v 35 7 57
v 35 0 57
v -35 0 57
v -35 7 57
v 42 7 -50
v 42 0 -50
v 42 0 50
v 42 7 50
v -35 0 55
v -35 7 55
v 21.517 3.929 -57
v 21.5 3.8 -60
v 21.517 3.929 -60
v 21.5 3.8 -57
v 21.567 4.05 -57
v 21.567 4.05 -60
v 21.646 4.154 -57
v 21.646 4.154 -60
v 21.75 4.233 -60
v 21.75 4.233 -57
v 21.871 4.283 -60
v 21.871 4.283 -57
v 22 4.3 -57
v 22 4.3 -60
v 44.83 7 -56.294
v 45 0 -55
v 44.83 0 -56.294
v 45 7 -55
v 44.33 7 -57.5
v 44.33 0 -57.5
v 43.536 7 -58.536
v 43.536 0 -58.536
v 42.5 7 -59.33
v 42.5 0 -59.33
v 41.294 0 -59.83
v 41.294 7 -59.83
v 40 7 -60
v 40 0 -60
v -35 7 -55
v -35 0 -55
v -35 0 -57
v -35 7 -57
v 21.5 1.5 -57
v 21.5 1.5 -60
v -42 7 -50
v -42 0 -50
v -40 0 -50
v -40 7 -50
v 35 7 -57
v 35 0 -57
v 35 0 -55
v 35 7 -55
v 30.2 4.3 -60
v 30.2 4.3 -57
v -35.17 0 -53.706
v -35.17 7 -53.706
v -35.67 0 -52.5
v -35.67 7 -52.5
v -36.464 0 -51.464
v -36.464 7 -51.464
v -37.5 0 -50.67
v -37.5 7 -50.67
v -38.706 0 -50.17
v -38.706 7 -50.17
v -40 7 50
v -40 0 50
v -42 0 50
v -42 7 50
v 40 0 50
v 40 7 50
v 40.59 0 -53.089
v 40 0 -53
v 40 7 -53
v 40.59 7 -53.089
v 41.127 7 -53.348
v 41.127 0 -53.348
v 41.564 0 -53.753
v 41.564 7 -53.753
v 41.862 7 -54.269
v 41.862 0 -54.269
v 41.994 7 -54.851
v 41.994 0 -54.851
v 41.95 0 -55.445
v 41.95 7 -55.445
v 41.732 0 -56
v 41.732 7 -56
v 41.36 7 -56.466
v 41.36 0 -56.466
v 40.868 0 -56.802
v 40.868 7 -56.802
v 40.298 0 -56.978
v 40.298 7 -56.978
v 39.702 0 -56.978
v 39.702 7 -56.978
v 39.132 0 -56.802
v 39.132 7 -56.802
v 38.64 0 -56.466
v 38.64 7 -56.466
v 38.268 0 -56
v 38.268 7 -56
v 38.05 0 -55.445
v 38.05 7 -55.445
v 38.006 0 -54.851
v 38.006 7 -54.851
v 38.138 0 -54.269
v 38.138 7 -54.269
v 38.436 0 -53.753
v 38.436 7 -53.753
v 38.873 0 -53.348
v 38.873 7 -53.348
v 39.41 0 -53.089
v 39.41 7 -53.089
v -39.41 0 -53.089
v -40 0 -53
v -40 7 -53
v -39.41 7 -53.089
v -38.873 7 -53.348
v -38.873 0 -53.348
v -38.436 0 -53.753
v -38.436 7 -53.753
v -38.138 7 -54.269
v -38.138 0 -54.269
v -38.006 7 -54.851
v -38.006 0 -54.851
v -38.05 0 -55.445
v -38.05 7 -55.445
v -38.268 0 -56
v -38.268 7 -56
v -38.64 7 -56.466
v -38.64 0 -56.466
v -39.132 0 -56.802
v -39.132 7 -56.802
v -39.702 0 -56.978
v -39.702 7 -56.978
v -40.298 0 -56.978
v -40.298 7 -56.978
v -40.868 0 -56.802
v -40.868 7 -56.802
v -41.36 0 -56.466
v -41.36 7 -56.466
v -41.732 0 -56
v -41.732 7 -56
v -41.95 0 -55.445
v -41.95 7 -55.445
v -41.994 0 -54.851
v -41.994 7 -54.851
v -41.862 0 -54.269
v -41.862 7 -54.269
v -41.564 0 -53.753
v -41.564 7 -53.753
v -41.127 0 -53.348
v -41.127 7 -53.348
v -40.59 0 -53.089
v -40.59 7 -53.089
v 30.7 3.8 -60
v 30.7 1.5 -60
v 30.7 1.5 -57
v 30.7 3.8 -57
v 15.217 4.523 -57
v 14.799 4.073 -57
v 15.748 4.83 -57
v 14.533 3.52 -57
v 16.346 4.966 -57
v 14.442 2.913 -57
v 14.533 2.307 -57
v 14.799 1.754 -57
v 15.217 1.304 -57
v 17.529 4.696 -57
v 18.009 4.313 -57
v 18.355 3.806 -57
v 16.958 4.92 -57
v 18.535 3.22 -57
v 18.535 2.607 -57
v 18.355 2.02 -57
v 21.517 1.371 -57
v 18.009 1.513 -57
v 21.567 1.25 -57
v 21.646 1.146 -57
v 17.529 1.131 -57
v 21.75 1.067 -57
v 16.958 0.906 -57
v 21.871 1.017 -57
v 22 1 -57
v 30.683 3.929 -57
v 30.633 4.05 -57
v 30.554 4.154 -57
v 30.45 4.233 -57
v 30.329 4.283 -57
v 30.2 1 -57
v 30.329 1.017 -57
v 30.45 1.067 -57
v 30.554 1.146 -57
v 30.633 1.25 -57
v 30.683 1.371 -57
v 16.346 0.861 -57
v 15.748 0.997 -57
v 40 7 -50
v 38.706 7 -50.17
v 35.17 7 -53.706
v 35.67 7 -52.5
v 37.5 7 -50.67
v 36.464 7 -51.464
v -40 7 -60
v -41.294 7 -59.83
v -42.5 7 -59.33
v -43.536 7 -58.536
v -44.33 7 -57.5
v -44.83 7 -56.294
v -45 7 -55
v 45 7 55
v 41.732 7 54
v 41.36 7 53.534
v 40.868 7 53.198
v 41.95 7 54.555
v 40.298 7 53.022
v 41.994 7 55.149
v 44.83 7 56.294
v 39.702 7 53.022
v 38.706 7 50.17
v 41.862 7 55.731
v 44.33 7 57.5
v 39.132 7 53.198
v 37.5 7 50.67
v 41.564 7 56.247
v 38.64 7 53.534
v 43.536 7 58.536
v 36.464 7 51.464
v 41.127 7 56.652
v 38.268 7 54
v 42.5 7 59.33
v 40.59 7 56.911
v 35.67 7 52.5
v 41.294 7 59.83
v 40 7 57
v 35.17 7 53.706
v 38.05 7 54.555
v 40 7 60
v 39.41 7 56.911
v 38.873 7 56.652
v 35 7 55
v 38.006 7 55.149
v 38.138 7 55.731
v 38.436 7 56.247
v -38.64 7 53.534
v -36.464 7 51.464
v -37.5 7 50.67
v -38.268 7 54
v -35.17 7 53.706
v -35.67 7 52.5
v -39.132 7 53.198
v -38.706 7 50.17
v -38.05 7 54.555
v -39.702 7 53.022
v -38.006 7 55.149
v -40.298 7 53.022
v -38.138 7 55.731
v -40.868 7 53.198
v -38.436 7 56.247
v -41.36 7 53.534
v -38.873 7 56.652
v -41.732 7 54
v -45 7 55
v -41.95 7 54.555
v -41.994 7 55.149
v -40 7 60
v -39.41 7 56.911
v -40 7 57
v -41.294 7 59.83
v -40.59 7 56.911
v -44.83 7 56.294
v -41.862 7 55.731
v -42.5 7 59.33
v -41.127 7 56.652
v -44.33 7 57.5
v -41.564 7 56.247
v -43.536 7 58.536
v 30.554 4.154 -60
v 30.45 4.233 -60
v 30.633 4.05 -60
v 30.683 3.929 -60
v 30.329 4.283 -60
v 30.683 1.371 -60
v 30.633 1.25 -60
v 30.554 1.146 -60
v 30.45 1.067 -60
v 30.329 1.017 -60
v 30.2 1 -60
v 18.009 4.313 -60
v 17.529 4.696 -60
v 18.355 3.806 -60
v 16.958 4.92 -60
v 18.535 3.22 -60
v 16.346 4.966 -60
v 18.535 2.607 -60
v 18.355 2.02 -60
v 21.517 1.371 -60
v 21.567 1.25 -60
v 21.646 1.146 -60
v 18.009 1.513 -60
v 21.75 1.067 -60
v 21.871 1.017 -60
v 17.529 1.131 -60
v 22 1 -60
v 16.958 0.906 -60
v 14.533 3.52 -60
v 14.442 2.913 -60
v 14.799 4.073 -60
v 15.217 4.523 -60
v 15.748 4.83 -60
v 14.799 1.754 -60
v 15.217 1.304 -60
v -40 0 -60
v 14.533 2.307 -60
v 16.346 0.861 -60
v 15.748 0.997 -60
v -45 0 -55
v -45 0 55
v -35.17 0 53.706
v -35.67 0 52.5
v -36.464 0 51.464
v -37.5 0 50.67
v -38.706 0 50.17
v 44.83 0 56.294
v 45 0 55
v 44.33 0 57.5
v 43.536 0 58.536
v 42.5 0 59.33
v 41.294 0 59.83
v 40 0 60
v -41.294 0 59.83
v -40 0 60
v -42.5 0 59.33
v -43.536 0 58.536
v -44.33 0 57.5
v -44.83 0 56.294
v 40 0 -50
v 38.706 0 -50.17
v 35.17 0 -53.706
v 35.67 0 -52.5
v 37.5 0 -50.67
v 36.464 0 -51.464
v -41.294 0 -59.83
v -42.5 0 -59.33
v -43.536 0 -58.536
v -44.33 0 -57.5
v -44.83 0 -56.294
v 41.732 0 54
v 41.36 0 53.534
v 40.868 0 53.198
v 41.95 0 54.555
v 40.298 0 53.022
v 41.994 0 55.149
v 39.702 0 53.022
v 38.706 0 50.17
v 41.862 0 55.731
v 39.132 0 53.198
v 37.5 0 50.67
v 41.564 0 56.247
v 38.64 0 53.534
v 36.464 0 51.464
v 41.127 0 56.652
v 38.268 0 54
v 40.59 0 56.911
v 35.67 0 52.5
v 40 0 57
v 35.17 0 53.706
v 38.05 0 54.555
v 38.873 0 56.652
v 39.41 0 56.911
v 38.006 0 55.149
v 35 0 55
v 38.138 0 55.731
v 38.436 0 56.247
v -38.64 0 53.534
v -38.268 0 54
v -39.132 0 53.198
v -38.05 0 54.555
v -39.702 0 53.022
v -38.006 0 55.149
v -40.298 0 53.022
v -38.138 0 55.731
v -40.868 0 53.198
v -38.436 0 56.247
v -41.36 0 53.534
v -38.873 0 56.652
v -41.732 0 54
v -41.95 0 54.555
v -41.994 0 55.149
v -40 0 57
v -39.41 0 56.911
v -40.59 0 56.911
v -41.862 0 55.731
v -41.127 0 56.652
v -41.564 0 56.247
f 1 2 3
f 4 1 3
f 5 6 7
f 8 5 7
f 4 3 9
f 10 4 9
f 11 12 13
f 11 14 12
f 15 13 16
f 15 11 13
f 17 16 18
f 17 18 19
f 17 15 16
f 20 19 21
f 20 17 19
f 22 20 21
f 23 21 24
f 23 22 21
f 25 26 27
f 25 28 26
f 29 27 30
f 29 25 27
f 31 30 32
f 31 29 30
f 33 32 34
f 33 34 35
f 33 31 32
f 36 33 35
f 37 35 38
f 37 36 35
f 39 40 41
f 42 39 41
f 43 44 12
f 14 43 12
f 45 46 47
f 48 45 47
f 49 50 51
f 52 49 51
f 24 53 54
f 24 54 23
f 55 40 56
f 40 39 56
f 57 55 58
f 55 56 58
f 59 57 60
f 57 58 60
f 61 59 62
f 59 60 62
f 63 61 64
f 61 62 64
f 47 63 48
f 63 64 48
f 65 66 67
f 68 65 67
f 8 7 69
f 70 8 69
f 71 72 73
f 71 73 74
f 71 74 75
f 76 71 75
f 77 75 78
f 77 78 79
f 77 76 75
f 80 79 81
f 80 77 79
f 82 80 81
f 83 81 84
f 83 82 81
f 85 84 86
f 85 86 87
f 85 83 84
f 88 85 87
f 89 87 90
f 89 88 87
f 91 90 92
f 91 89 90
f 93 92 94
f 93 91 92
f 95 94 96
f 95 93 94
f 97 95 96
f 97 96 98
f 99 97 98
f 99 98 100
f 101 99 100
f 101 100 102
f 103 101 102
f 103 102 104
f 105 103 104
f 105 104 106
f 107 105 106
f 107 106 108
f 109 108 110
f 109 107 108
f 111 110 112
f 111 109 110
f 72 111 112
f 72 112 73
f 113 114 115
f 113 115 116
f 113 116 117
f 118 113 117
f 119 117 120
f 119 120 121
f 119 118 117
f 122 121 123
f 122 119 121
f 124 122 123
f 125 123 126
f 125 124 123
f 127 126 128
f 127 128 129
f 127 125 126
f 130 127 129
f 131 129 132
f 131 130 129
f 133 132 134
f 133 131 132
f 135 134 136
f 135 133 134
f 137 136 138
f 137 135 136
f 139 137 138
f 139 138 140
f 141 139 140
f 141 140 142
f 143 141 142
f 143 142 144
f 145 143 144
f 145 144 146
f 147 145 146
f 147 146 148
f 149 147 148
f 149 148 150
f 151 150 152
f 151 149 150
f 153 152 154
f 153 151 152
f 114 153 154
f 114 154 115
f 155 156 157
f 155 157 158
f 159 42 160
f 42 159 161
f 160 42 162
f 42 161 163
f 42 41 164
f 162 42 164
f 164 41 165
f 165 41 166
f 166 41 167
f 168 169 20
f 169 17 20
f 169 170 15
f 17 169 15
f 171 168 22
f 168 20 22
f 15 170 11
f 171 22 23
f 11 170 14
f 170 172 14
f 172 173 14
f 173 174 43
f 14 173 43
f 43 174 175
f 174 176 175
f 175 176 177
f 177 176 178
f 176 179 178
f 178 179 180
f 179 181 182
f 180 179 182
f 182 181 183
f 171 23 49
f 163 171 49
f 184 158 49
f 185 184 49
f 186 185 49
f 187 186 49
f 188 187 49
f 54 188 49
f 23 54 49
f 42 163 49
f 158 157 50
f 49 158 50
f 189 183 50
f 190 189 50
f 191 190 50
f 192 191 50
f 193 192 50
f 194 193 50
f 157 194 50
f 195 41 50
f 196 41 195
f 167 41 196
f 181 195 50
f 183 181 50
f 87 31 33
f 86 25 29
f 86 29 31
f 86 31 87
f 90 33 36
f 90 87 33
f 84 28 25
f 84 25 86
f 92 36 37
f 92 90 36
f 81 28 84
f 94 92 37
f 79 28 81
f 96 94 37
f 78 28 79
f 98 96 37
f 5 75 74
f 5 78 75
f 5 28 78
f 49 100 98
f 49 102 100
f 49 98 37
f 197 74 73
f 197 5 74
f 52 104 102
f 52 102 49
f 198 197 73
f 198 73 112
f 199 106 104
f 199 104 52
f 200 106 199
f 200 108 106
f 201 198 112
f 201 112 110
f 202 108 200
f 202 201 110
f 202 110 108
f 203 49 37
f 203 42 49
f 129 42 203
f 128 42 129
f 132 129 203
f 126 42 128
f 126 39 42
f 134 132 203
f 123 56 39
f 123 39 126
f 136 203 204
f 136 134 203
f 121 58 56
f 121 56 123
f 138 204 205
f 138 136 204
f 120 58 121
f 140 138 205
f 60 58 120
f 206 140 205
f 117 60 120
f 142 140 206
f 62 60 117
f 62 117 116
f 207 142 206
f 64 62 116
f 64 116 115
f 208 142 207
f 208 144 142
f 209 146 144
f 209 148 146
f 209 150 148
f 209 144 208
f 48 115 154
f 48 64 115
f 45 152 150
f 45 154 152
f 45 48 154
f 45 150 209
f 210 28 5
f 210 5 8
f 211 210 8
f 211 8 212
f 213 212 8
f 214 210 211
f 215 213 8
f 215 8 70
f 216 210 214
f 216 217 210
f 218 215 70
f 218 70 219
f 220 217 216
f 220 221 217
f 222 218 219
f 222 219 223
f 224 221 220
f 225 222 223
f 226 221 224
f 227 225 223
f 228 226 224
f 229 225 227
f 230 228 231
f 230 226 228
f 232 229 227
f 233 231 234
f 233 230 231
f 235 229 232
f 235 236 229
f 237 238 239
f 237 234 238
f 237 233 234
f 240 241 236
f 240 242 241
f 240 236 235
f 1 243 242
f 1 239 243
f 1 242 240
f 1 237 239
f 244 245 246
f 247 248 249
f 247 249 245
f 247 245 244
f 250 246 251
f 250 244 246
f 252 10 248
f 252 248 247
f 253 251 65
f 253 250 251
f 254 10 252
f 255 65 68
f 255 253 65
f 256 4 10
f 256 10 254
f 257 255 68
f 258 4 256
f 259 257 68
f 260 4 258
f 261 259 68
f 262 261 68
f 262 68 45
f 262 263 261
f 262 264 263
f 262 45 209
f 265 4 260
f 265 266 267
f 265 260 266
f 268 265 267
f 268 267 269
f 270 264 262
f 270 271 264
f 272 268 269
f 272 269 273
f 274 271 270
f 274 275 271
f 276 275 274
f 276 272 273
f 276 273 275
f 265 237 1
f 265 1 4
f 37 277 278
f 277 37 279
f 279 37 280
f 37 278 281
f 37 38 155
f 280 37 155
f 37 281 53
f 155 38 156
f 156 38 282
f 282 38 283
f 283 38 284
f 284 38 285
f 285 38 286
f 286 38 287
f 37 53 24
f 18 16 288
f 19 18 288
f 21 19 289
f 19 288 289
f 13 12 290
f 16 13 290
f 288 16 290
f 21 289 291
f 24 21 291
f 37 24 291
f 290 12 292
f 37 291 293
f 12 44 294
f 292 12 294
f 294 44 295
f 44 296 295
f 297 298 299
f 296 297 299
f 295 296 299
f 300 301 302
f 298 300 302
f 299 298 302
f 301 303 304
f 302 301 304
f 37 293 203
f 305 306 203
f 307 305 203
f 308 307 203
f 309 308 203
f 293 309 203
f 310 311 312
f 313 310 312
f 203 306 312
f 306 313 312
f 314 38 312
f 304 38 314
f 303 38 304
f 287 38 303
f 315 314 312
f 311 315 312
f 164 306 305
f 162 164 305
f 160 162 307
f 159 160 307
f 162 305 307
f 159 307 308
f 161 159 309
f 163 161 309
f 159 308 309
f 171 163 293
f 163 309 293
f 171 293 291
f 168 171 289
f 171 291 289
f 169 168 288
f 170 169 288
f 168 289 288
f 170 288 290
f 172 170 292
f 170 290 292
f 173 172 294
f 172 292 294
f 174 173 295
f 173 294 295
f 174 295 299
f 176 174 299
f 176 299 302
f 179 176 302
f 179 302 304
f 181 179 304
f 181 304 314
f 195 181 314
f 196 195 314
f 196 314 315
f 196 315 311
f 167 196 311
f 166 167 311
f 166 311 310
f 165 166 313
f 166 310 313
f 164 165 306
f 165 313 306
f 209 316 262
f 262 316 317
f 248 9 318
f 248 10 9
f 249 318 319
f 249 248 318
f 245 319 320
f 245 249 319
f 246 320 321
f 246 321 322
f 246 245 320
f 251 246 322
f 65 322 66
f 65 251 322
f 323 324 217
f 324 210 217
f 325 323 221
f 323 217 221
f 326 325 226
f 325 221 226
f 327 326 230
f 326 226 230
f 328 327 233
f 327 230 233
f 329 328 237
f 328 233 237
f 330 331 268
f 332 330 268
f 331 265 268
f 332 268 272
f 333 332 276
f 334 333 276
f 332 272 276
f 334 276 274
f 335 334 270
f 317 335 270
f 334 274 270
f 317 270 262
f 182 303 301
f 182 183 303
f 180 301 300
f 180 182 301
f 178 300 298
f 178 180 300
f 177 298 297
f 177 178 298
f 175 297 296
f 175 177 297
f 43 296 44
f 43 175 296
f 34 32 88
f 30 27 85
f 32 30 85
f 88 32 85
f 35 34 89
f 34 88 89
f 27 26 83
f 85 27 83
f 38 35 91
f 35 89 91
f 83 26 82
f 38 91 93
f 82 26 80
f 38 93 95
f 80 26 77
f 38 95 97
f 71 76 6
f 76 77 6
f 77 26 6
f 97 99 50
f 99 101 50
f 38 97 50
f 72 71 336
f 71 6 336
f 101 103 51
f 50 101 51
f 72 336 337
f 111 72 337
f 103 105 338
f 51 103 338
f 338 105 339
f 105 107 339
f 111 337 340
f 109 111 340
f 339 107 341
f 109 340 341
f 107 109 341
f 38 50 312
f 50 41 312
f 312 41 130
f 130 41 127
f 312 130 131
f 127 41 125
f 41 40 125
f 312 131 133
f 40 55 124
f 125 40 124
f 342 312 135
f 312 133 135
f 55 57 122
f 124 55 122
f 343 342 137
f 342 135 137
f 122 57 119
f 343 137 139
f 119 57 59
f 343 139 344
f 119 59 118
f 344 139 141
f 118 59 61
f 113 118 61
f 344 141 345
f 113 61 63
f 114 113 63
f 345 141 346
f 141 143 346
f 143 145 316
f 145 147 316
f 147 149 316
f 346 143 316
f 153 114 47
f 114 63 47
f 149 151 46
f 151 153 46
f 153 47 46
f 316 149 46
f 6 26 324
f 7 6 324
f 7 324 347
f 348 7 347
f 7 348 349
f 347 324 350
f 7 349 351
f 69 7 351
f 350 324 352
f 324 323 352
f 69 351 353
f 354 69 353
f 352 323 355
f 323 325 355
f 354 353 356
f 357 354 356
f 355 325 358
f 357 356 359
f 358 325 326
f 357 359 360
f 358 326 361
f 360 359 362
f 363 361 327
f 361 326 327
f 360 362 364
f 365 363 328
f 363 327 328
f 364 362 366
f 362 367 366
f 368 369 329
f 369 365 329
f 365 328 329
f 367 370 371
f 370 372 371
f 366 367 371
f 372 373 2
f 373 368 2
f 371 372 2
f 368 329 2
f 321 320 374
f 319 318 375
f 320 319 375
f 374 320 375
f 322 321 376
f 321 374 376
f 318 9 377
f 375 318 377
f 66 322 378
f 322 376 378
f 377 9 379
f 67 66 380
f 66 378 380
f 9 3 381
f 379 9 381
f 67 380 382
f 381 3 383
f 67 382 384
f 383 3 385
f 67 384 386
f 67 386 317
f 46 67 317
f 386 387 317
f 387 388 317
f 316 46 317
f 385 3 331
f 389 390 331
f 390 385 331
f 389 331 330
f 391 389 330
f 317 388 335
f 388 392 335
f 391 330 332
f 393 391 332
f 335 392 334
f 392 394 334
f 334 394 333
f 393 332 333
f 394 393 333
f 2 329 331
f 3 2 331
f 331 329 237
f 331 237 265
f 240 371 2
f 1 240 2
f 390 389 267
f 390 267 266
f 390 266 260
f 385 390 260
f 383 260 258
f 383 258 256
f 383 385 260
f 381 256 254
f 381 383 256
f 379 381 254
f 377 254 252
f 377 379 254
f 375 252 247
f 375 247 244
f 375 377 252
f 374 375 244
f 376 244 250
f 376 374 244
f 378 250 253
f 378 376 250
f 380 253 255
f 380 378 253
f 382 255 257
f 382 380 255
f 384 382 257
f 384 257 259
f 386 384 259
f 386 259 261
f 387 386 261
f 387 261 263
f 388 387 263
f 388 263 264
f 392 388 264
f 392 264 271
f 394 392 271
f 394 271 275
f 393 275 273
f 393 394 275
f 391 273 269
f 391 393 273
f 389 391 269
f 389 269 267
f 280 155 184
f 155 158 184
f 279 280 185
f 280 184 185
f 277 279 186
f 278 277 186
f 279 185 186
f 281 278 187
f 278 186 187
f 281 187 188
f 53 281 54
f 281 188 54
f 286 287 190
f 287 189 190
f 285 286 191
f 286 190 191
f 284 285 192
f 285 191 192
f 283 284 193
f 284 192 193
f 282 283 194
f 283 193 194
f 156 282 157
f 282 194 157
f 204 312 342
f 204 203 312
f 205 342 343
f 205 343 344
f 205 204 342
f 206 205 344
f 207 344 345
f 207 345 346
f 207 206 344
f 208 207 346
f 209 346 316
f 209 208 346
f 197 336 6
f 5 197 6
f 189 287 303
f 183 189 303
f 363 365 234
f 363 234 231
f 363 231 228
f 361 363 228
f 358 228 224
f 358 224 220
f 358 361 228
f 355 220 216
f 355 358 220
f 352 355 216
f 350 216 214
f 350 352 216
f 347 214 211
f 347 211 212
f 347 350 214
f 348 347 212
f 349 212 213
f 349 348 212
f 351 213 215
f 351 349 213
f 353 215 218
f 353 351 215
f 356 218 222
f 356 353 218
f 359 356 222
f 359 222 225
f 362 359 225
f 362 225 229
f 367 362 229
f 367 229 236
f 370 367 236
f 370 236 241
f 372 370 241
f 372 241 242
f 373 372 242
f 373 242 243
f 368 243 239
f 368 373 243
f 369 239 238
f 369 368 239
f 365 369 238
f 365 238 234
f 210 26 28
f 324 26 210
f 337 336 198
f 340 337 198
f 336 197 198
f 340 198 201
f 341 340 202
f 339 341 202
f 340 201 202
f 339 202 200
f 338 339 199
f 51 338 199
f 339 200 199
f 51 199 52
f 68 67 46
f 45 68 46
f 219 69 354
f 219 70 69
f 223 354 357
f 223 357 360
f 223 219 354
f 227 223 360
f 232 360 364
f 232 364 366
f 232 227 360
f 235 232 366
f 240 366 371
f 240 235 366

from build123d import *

# Parameters (mm, degrees)
SKETCH_3_W          = 90
SKETCH_3_H          = 120
SKETCH_3_R          = 2
EXTRUDE_2_DEPTH     = 7
FILLET_1_R          = 5
FILLET_2_R          = 5
FILLET_3_R          = 5
FILLET_4_R          = 5
FILLET_5_R          = 5
FILLET_6_R          = 5
SKETCH_4_W          = 9.2
SKETCH_4_H          = 3.3
CUT_EXTRUDE_1_DEPTH = 3
FILLET_7_R          = 0.5
FILLET_8_R          = 0.5
FILLET_9_R          = 0.5
FILLET_10_R         = 0.5
SKETCH_5_R          = 2.058488494
CUT_EXTRUDE_2_DEPTH = 3


with BuildPart() as part:
    # 草图3 → 凸台-拉伸2 (new body)
    with BuildSketch(Plane(origin=(0, 0, 0), x_dir=(-1, 0, 0), z_dir=(0, 1, 0))):
        Rectangle(SKETCH_3_W, SKETCH_3_H)
        with Locations(Location((40, 55, 0), (0, 0, 90))):
            Circle(SKETCH_3_R, mode=Mode.SUBTRACT)
        with Locations(Location((40, -55, 0), (0, 0, 90))):
            Circle(SKETCH_3_R, mode=Mode.SUBTRACT)
        with Locations(Location((-40, -55, 0), (0, 0, 90))):
            Circle(SKETCH_3_R, mode=Mode.SUBTRACT)
        with Locations(Location((-40, 55, 0), (0, 0, 90))):
            Circle(SKETCH_3_R, mode=Mode.SUBTRACT)
        Polygon((-42, -50), (-42, 50), (-35, 50), (-35, 57), (35, 57), (35, 50), (42, 50), (42, -50), (35, -50), (35, -57), (-35, -57), (-35, -50), align=None, mode=Mode.SUBTRACT)
    extrude(amount=EXTRUDE_2_DEPTH)

    # 圆角1
    fillet_1_edges = [part.edges().sort_by_distance(p)[0] for p in [
        (45, 3.5, -60),
        (45, 3.5, 60),
        (-45, 3.5, 60),
    ]]
    fillet(fillet_1_edges, radius=FILLET_1_R)

    # 圆角2
    fillet_2_edges = [part.edges().sort_by_distance(p)[0] for p in [
        (-45, 3.5, -60),
    ]]
    fillet(fillet_2_edges, radius=FILLET_2_R)

    # 圆角3
    fillet_3_edges = [part.edges().sort_by_distance(p)[0] for p in [
        (35, 3.5, -50),
    ]]
    fillet(fillet_3_edges, radius=FILLET_3_R)

    # 圆角4
    fillet_4_edges = [part.edges().sort_by_distance(p)[0] for p in [
        (-35, 3.5, -50),
    ]]
    fillet(fillet_4_edges, radius=FILLET_4_R)

    # 圆角5
    fillet_5_edges = [part.edges().sort_by_distance(p)[0] for p in [
        (35, 3.5, 50),
    ]]
    fillet(fillet_5_edges, radius=FILLET_5_R)

    # 圆角6
    fillet_6_edges = [part.edges().sort_by_distance(p)[0] for p in [
        (-35, 3.5, 50),
    ]]
    fillet(fillet_6_edges, radius=FILLET_6_R)

    # 草图4 → 切除-拉伸1 (cut)
    with BuildSketch(Plane(origin=(0, 0, -60), x_dir=(-1, 0, 0), z_dir=(0, 0, -1))):
        with Locations((-26.1, 2.65)):
            Rectangle(SKETCH_4_W, SKETCH_4_H)
    extrude(amount=-CUT_EXTRUDE_1_DEPTH, mode=Mode.SUBTRACT)

    # 圆角7
    fillet_7_edges = [part.edges().sort_by_distance(p)[0] for p in [
        (21.5, 1, -58.5),
    ]]
    fillet(fillet_7_edges, radius=FILLET_7_R)

    # 圆角8
    fillet_8_edges = [part.edges().sort_by_distance(p)[0] for p in [
        (21.5, 4.3, -58.5),
    ]]
    fillet(fillet_8_edges, radius=FILLET_8_R)

    # 圆角9
    fillet_9_edges = [part.edges().sort_by_distance(p)[0] for p in [
        (30.7, 1, -58.5),
    ]]
    fillet(fillet_9_edges, radius=FILLET_9_R)

    # 圆角10
    fillet_10_edges = [part.edges().sort_by_distance(p)[0] for p in [
        (30.7, 4.3, -58.5),
    ]]
    fillet(fillet_10_edges, radius=FILLET_10_R)

    # 草图5 → 切除-拉伸2 (cut)
    with BuildSketch(Plane(origin=(0, 0, -60), x_dir=(-1, 0, 0), z_dir=(0, 0, -1))):
        with Locations((-16.5, 2.913308791)):
            Circle(SKETCH_5_R)
    extrude(amount=-CUT_EXTRUDE_2_DEPTH, mode=Mode.SUBTRACT)


solid = part.part
